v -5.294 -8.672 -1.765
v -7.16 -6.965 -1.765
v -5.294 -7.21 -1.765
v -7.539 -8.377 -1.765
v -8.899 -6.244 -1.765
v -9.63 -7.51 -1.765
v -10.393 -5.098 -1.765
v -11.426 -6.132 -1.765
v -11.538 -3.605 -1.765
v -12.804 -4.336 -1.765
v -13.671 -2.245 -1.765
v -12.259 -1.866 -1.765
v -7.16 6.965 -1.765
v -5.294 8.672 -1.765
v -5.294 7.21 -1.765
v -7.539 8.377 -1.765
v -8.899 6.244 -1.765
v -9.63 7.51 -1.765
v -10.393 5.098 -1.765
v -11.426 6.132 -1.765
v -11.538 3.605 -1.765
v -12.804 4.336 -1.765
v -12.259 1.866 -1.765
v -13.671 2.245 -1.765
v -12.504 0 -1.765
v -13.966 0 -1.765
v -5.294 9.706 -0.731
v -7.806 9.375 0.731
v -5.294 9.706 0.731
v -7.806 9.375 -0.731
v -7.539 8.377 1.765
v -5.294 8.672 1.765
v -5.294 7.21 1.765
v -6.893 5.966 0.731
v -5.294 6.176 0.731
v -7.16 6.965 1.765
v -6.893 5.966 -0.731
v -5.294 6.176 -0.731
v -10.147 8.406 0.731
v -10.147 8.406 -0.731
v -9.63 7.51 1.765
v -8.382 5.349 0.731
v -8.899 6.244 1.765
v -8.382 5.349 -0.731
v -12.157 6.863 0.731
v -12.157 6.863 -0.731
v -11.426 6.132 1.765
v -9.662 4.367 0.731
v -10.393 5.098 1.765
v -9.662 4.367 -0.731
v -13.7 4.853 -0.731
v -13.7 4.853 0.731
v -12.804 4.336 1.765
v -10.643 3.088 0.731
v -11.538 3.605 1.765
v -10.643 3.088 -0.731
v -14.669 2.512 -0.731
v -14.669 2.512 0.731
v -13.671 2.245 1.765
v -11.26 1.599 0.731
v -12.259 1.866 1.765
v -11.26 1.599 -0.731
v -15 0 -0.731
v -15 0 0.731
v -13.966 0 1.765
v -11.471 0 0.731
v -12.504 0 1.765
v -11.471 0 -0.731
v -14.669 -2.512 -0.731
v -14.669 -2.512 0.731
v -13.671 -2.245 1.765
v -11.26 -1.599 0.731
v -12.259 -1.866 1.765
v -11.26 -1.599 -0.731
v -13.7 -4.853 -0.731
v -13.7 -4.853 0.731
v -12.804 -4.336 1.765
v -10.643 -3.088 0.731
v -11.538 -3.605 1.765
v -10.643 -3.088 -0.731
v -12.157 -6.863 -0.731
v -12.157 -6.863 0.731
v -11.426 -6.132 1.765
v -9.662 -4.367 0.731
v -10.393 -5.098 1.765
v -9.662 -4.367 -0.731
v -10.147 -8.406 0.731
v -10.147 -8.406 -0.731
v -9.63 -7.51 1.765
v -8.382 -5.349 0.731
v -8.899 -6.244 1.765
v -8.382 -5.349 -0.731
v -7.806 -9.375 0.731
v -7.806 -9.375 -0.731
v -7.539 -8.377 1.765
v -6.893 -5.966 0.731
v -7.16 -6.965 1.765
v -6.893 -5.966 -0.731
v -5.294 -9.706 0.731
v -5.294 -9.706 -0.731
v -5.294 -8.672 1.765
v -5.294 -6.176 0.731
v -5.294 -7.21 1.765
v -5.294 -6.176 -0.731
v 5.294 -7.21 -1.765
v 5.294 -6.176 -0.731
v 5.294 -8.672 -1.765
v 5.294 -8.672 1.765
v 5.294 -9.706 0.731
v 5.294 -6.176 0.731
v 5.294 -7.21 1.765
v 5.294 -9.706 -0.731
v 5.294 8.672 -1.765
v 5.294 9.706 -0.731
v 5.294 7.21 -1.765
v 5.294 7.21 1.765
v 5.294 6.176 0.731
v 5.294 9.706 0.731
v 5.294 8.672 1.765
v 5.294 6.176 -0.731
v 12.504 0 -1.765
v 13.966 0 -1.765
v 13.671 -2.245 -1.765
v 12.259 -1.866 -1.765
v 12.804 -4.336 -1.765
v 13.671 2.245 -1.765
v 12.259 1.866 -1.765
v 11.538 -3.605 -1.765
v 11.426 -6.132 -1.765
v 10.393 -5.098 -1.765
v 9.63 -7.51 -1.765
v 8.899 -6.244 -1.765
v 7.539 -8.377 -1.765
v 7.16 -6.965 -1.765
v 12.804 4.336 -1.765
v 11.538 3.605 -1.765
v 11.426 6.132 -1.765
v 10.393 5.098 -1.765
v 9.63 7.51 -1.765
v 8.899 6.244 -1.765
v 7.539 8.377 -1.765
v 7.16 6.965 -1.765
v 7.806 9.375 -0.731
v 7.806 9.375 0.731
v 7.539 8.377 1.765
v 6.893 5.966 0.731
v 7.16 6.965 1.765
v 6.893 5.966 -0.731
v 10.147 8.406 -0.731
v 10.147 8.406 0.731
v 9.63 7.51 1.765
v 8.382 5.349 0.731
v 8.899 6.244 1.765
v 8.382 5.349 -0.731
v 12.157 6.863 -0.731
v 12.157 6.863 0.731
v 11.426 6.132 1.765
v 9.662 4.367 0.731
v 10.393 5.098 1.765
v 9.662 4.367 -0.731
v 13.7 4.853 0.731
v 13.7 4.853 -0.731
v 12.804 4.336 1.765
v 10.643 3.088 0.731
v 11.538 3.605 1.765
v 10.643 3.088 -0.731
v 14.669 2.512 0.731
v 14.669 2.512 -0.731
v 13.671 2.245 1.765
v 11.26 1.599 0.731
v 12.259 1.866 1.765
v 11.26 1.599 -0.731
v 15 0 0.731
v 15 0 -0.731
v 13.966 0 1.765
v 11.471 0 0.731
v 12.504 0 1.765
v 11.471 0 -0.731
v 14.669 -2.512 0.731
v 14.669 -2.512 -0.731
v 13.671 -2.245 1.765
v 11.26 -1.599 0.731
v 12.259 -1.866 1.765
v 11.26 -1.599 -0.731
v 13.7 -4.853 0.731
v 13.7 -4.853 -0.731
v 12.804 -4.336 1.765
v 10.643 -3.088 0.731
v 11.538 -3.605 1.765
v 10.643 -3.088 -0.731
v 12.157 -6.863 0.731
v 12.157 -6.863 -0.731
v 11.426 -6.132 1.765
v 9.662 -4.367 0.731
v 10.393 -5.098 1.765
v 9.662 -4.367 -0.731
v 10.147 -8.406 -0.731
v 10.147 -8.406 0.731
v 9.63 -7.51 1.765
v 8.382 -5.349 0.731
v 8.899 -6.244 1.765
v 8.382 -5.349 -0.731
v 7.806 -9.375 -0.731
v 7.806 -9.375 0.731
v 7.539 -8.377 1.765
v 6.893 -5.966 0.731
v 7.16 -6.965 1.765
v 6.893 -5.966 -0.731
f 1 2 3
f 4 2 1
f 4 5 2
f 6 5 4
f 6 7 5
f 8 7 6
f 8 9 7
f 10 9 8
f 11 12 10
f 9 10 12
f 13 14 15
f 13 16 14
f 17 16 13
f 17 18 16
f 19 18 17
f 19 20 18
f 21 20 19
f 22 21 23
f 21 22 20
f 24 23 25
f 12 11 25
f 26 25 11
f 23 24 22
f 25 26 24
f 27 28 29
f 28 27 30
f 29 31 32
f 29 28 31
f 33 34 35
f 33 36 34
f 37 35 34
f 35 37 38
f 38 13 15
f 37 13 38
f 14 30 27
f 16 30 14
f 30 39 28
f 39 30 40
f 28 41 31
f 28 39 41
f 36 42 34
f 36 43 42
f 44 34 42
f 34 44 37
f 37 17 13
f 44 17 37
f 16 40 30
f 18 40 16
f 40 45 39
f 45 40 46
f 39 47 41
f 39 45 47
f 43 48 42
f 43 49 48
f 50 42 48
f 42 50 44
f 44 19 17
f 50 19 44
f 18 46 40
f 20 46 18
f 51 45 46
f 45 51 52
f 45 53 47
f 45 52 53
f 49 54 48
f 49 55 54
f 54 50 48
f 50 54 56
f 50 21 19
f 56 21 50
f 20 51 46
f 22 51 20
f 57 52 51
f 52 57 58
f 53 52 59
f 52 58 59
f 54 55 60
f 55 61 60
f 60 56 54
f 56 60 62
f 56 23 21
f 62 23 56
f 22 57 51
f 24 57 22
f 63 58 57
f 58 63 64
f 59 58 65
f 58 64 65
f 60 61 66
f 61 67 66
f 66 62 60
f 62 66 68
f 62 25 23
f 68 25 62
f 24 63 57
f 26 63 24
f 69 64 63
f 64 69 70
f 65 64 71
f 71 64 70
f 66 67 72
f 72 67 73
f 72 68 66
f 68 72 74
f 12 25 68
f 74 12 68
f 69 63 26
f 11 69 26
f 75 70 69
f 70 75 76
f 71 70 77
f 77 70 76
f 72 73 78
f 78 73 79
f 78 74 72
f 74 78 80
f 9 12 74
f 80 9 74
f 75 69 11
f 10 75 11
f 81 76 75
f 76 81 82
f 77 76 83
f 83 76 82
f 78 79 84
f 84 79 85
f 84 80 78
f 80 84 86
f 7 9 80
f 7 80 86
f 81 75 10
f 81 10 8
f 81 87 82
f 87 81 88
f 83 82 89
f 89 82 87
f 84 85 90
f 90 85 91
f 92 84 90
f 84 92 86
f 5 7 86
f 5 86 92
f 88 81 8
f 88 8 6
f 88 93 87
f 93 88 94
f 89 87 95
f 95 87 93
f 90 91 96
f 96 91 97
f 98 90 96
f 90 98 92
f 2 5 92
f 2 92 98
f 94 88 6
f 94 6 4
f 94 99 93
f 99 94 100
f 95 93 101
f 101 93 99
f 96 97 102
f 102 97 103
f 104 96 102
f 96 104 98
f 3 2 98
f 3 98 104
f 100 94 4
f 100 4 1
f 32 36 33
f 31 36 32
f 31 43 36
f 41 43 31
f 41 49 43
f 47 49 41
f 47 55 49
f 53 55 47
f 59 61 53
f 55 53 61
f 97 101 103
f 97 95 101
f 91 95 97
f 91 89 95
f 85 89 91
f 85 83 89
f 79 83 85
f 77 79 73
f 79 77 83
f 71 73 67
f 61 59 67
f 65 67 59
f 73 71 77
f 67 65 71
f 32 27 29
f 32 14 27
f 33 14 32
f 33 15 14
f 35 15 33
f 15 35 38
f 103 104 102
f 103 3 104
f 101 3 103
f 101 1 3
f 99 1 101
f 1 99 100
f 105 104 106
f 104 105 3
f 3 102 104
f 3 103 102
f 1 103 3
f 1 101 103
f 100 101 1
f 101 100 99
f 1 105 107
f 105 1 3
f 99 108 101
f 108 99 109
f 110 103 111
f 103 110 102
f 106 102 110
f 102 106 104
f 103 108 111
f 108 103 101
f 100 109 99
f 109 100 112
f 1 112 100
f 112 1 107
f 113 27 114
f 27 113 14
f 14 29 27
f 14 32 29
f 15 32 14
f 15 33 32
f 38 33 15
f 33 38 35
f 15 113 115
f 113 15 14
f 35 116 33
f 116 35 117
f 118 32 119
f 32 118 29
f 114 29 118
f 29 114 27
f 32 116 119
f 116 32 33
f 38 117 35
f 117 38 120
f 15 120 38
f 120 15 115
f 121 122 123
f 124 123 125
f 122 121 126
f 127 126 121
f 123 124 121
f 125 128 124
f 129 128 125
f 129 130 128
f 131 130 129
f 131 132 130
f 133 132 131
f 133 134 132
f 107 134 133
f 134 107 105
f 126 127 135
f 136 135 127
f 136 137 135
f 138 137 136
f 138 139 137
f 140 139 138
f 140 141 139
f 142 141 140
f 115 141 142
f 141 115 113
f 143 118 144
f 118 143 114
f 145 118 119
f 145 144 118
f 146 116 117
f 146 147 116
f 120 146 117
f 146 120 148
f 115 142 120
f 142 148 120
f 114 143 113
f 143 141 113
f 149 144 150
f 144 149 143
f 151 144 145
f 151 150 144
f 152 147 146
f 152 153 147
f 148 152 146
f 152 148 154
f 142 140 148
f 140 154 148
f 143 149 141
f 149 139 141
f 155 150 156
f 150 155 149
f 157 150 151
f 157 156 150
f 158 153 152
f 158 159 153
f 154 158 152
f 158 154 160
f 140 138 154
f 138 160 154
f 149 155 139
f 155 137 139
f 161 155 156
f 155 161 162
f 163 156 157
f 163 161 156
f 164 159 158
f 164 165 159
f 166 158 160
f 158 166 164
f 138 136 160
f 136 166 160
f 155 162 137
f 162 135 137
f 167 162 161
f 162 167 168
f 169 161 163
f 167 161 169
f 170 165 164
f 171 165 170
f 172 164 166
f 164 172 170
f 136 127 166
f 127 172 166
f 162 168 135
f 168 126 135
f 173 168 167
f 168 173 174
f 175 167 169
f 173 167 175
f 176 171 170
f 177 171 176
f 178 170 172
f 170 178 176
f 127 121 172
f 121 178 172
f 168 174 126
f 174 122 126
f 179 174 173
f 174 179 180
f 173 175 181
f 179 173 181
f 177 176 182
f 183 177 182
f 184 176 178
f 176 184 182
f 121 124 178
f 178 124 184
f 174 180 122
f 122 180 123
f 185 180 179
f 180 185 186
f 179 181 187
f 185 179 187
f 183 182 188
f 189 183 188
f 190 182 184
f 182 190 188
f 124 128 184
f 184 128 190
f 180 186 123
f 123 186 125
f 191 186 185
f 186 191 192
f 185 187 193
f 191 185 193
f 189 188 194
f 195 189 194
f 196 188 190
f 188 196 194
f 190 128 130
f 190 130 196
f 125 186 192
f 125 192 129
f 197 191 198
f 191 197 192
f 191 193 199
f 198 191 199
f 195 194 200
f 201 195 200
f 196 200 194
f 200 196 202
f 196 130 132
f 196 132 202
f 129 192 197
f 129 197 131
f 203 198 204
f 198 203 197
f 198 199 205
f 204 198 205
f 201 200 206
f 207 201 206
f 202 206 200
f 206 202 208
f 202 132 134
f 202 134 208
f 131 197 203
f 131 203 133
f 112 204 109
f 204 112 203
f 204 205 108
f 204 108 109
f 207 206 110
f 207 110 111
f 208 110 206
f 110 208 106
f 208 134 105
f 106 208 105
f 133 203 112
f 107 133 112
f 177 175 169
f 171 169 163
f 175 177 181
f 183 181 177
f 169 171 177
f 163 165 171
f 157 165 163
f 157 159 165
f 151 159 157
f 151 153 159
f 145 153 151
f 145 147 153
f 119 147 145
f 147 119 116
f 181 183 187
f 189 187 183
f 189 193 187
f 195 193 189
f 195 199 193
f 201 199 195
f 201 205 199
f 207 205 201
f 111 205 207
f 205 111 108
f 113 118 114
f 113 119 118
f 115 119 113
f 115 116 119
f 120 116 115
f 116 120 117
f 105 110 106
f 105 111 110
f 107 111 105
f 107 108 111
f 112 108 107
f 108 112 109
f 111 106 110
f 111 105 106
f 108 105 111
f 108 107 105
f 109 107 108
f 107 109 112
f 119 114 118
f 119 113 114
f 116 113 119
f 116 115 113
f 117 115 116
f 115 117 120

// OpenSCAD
od = 30;
aspect_ratio = 6.5;
gauge = od / (aspect_ratio + 2);

module octagon_2d(gauge) {
  intersection_for(a = [0, 45])
    rotate([0, 0, a])
      square(gauge, center=true);
}

module torus(od, gauge, gap_angle) {
  rotate([0, 0, gap_angle])
    rotate_extrude($fn=24, angle=360-2*gap_angle)
      translate([od/2-gauge/2, 0])
        octagon_2d(gauge);
}

module ring(gap=true) {
  gap_angle = gap ? 7 : 0;
  
  torus(od, gauge, gap_angle);
  
  // Round tips.
  if (gap)
    for (a = [-1, 1])
      scale([1, a, 1])
        hull()
          for (packet = [[1.2, 0.6], [gap_angle, 1]])
            rotate([0, 0, -packet[0]])
              translate([od/2-gauge/2, 0])
                rotate([90, 0, 0])
                  linear_extrude(0.0001)
                    scale(packet[1])
                      octagon_2d(gauge);
}

module border_link() {
  my_od = gauge*5.5;
  length = od;
  
  for (a = [-1, 1]) {
    scale([a, 1, 1]) {
      translate([length/2-my_od/2, 0, 0]) {
        intersection() {
          torus(my_od, gauge, 0);
          translate([(my_od+1)/2, 0, 0])
            cube(my_od+1, center=true);
        }
      }
      
      for (b = [-1, 1])
        translate([0, b*(my_od/2-gauge/2), 0])
          rotate([0, 90, 0])
            linear_extrude(length/2-my_od/2)
              octagon_2d(gauge);
    }
  }
}

border_link();
